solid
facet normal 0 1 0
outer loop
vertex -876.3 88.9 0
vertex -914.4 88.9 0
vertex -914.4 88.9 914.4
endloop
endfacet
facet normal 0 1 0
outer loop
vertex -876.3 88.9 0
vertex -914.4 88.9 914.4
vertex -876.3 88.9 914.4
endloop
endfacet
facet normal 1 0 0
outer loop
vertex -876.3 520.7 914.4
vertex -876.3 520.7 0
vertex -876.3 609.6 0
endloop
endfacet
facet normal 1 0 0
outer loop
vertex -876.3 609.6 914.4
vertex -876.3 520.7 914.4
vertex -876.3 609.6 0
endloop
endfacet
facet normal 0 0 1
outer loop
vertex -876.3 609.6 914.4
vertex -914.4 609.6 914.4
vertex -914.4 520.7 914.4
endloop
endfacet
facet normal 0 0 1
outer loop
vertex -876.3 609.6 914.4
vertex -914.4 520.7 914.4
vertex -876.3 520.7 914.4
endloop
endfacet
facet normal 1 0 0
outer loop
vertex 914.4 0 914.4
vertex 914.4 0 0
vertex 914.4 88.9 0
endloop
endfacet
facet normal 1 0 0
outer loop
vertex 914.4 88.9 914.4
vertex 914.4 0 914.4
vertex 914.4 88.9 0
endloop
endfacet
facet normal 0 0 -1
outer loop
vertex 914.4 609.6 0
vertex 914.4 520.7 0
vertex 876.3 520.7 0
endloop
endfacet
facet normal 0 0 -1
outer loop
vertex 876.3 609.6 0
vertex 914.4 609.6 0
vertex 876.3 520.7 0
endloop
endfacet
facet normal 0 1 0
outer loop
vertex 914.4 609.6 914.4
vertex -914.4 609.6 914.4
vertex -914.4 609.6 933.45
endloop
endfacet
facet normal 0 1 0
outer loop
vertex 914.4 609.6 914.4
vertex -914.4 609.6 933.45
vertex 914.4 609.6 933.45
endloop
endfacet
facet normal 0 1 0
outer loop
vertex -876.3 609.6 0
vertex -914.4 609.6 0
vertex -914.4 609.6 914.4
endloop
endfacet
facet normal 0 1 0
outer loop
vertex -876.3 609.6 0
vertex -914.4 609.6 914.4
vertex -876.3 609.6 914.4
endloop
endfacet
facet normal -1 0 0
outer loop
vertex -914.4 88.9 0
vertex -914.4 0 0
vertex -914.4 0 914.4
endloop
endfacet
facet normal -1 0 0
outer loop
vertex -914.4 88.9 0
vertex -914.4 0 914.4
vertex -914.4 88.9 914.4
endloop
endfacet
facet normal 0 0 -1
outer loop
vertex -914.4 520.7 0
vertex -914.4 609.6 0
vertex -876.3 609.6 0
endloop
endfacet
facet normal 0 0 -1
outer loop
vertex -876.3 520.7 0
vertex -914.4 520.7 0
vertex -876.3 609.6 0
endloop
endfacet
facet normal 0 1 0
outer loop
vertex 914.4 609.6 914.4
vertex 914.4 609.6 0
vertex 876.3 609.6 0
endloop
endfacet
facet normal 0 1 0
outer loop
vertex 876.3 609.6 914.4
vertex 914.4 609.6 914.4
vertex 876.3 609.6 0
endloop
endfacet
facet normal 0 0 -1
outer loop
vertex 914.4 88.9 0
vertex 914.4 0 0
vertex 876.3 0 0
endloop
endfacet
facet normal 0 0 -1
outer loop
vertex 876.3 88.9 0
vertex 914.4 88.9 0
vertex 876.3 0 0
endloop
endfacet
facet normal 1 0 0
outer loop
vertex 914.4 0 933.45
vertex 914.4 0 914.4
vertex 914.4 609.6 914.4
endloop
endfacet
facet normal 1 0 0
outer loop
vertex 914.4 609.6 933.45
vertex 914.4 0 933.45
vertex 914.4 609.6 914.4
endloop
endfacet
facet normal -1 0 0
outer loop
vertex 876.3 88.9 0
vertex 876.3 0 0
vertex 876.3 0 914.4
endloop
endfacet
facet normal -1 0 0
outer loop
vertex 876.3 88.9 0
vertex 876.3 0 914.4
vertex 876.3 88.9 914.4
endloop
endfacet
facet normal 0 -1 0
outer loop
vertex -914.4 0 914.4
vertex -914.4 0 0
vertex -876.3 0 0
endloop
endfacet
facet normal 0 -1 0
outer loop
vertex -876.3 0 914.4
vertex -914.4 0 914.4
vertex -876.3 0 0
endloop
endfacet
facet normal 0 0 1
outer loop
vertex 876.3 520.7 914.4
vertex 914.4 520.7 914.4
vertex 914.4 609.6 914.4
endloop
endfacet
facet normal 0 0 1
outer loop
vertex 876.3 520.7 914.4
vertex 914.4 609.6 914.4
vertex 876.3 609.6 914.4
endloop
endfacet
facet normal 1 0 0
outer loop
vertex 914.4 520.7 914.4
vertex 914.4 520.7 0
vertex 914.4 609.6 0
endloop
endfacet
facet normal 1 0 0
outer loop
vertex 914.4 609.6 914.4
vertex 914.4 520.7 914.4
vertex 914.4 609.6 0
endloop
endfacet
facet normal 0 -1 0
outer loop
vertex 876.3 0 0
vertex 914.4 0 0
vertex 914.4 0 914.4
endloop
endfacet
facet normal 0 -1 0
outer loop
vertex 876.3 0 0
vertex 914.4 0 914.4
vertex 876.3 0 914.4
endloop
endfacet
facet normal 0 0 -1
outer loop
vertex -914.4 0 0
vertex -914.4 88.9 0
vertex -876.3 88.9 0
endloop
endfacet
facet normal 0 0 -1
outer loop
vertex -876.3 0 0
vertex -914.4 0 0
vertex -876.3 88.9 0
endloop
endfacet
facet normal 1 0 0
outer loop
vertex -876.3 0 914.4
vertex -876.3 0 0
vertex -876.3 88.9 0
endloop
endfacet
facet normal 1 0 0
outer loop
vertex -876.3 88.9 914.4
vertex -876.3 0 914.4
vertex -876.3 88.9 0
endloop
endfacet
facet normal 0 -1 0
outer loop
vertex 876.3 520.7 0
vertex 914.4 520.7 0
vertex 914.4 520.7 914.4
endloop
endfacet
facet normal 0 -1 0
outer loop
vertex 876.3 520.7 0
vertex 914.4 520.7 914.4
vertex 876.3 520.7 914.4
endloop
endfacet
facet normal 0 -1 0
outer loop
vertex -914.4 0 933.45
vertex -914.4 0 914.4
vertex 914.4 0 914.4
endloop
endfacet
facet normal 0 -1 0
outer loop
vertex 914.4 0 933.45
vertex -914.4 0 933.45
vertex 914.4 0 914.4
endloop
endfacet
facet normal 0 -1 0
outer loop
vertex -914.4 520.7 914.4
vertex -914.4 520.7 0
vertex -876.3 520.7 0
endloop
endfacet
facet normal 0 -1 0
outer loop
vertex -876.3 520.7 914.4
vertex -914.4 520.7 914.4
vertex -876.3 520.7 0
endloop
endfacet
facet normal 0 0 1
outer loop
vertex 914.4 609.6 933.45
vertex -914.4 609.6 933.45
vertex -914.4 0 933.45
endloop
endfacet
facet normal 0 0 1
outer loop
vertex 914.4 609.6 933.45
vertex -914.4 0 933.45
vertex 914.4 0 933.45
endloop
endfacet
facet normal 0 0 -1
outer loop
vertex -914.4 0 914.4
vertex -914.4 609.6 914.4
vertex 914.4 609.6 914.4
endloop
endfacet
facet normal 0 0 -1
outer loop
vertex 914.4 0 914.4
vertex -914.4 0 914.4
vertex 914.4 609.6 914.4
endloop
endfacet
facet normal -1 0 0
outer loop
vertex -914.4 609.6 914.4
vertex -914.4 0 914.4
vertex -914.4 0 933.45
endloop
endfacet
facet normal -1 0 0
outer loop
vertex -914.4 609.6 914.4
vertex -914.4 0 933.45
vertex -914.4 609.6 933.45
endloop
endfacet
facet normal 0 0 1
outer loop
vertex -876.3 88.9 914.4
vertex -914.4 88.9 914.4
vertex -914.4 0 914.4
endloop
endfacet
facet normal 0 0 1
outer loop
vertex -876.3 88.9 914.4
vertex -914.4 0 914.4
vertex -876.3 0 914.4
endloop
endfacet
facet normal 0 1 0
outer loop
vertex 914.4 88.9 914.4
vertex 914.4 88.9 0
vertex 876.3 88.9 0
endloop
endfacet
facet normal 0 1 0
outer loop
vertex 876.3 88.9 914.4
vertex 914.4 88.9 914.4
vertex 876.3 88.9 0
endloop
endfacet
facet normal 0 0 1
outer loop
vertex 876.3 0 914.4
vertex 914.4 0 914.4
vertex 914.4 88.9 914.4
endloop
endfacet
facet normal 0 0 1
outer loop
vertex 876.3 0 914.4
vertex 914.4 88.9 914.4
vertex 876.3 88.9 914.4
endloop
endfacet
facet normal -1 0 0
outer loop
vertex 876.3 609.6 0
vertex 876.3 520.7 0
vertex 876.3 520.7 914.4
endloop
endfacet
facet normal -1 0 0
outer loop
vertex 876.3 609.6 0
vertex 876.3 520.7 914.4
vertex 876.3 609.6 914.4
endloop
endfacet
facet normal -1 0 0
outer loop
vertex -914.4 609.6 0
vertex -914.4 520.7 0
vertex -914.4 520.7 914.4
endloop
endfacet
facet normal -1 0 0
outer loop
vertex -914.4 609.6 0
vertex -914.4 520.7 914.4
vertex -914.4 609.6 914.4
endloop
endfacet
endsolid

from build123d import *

# Parameters (mm, degrees)
F0_W     = 38.1
F0_H     = 88.9
F1_DEPTH = 914.4
F4_W     = 1828.8
F4_H     = 609.6
F5_DEPTH = 19.05


with BuildPart() as f1:
    # F0 (on Top) → F1 (new body)
    with BuildSketch(Plane.XY):
        with Locations((-895.35, 565.15)):
            Rectangle(F0_W, F0_H)
    extrude(amount=F1_DEPTH)


with BuildPart() as f1b:
    # F0 (on Top) → F1, piece 2 (new body)
    with BuildSketch(Plane.XY):
        with Locations((-895.35, 44.45)):
            Rectangle(F0_W, F0_H)
    extrude(amount=F1_DEPTH)


with BuildPart() as f2_1:
    # F2: instance of F1b
    add(f1b.part.mirror(Plane.YZ))


with BuildPart() as f2_2:
    # F2: instance of F1
    add(f1.part.mirror(Plane.YZ))


with BuildPart() as f5:
    # F4 (on plane+point) → F5 (new body)
    with BuildSketch(Plane.XY.offset(914.4)):
        with Locations((0, 304.8)):
            Rectangle(F4_W, F4_H)
    extrude(amount=F5_DEPTH)


solid = Compound([f1.part, f1b.part, f2_1.part, f2_2.part, f5.part])
